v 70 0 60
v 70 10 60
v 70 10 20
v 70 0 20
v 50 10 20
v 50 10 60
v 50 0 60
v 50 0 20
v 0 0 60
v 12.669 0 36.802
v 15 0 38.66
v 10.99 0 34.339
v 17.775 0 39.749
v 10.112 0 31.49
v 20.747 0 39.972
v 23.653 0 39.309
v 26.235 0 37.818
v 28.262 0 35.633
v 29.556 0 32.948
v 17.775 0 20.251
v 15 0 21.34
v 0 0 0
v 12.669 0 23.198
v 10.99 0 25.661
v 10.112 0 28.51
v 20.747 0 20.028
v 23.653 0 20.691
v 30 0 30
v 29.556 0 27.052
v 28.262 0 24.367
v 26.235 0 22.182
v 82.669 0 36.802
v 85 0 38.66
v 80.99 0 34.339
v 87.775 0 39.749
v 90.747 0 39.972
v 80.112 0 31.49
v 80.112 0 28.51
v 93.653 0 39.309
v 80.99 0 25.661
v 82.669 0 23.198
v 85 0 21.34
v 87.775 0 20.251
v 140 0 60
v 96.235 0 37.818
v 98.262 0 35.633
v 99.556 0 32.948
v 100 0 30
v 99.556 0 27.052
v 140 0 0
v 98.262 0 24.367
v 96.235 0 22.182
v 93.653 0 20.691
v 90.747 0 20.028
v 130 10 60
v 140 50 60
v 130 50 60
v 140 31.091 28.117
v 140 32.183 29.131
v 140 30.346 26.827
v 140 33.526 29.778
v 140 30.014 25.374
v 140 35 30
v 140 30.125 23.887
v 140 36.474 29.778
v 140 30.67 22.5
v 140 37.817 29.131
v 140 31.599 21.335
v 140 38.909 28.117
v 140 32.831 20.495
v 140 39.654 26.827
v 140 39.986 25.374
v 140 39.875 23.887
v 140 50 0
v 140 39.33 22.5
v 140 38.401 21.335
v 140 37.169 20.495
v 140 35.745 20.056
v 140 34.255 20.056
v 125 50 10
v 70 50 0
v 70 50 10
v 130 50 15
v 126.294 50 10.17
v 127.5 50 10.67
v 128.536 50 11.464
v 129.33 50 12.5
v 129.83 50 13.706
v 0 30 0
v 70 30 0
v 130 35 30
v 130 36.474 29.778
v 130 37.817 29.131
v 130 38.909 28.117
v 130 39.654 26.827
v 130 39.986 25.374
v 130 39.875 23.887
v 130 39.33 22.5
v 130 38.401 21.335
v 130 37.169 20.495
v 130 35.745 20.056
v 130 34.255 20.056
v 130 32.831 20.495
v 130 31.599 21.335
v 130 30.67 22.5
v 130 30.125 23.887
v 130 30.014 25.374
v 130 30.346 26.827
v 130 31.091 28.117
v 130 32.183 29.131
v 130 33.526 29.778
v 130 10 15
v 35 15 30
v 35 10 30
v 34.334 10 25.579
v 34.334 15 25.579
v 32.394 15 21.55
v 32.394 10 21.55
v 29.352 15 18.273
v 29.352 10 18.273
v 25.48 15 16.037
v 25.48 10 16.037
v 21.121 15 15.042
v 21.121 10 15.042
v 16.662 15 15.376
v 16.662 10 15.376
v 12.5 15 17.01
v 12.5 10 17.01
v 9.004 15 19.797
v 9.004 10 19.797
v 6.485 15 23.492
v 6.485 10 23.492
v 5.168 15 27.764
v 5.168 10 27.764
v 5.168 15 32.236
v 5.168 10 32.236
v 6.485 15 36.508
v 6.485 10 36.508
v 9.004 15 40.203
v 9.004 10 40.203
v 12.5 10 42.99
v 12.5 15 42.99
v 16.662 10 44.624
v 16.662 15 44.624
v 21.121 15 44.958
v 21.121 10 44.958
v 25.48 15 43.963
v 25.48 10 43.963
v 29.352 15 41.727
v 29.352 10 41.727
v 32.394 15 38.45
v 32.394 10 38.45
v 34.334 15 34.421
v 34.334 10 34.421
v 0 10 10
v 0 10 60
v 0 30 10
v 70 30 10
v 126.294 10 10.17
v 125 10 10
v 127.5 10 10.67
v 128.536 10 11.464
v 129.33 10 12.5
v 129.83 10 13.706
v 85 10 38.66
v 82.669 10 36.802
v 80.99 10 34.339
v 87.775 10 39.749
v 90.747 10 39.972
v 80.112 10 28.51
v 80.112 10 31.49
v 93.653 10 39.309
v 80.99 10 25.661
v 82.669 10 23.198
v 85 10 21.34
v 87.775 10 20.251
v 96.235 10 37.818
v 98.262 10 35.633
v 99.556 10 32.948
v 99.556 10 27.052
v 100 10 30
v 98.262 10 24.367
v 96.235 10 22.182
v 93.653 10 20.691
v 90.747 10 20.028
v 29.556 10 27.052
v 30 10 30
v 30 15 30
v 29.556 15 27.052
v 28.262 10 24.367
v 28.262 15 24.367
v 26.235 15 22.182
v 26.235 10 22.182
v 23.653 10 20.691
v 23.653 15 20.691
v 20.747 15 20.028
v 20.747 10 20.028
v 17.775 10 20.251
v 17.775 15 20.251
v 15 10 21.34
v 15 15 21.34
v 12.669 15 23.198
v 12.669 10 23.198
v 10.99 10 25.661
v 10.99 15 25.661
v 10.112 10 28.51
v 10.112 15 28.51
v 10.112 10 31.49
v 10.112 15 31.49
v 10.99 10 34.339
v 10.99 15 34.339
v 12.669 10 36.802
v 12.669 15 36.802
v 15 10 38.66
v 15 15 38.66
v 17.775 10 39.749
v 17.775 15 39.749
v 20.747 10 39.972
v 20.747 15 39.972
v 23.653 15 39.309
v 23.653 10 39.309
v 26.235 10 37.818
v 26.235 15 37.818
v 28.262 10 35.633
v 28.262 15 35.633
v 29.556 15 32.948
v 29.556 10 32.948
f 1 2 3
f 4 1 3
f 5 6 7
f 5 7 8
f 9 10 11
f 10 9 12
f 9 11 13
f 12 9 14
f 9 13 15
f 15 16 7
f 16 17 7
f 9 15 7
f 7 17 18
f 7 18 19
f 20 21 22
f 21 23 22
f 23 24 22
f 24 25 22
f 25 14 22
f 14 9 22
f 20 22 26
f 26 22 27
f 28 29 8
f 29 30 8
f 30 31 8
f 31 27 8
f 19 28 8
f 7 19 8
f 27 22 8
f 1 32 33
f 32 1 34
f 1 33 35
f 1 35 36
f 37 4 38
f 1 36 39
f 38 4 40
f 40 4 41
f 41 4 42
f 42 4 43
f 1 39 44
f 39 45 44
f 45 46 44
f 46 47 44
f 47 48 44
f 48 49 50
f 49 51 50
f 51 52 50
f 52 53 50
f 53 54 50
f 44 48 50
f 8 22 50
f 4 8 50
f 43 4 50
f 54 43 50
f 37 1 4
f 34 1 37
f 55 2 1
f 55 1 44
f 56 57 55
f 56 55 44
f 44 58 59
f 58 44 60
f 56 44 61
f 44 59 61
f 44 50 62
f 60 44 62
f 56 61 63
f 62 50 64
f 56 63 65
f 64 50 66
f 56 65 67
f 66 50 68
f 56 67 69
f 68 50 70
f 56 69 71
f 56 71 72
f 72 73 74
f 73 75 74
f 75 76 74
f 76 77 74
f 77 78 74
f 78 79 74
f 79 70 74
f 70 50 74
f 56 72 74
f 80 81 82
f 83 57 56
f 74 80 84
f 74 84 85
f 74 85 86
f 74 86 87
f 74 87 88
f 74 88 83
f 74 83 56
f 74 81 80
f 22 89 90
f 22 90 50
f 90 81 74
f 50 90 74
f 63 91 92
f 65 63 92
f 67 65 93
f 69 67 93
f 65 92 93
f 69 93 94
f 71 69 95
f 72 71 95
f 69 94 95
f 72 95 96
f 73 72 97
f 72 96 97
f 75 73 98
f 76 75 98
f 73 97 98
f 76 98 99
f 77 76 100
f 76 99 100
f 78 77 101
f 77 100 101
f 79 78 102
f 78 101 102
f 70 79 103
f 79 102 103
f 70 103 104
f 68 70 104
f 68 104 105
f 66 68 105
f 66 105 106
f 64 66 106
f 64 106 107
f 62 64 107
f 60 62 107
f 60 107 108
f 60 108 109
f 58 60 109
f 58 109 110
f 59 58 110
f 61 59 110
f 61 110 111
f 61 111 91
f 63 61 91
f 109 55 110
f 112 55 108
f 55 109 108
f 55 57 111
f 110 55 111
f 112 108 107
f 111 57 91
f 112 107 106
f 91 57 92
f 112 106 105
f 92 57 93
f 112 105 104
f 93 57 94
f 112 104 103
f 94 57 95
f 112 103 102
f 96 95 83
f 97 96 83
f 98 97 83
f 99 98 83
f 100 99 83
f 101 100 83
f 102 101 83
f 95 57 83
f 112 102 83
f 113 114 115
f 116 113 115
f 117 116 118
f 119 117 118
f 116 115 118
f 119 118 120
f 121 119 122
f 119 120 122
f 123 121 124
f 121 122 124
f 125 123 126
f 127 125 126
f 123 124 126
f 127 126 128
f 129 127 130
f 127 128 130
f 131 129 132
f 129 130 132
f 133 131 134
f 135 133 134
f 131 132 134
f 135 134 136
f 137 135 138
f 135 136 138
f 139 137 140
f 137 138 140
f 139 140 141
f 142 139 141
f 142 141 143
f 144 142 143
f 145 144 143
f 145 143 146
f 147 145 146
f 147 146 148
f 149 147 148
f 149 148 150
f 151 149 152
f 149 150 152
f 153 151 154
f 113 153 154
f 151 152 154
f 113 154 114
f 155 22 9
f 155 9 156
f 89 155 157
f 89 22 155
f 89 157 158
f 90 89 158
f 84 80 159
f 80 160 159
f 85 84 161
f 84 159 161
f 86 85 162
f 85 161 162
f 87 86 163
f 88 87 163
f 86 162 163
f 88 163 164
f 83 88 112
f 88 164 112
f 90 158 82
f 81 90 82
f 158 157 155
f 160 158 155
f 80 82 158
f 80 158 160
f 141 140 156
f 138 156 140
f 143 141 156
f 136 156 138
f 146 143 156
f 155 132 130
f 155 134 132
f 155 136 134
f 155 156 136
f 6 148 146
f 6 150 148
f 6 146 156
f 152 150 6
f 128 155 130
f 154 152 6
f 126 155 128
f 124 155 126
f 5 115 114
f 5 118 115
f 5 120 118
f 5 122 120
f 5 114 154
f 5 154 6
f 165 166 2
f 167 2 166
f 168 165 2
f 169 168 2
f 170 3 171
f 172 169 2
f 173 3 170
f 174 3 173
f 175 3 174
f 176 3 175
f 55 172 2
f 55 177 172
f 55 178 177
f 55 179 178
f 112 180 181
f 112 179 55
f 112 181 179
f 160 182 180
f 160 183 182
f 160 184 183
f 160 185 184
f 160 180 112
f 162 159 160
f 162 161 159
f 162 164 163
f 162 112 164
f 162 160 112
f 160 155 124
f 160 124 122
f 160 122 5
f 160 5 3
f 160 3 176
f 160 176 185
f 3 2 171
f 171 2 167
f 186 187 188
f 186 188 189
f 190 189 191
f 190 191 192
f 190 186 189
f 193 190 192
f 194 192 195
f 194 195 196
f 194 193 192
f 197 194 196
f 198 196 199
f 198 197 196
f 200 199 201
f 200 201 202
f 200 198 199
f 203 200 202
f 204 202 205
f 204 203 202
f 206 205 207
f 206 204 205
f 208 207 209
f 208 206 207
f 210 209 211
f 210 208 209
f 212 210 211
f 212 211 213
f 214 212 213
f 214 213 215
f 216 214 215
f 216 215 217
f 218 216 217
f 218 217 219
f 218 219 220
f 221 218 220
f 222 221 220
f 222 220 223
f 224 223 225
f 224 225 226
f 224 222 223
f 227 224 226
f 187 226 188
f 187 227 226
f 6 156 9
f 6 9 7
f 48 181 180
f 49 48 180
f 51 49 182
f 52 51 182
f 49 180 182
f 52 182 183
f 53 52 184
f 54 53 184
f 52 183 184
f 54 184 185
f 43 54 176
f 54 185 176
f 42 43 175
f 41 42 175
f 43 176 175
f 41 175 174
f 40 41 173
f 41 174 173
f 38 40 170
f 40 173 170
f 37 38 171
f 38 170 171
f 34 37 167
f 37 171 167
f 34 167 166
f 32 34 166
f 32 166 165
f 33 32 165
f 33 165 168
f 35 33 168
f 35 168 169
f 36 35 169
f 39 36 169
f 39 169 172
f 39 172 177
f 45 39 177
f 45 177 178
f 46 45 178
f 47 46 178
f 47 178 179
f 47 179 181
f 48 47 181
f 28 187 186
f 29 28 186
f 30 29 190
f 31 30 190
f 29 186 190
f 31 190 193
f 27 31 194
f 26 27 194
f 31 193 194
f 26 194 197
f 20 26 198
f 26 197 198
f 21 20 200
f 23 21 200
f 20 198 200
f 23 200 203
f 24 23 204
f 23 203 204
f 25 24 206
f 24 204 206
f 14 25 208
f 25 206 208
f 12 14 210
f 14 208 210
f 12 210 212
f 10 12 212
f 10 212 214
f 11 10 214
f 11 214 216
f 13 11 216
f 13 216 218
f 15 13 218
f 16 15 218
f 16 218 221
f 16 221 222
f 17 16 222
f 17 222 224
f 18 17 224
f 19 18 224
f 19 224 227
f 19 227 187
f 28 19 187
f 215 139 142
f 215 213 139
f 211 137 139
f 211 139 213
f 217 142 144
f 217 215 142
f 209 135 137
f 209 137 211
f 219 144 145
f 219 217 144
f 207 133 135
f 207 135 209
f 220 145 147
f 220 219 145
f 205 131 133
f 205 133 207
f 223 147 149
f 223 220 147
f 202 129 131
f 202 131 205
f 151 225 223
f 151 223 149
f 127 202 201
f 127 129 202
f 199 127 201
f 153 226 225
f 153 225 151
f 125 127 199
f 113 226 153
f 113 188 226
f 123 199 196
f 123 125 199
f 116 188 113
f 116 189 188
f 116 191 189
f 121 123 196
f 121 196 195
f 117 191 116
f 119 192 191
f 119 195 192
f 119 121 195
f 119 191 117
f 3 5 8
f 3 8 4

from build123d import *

# Parameters (mm, degrees)
IZIM1_W                     = 140
IZIM1_H                     = 50
Y_KSEKLIK_EKSTR_ZYON1_DEPTH = 60
IZIM2_W                     = 130
IZIM2_H                     = 50
KES_EKSTR_ZYON1_DEPTH       = 40
RADYUS1_R                   = 5
IZIM3_R                     = 15
IZIM3_R_2                   = 10
Y_KSEKLIK_EKSTR_ZYON2_DEPTH = 5
IZIM3_2_R                   = 10
KES_EKSTR_ZYON2_DEPTH       = 11
IZIM5_W                     = 70
IZIM5_H                     = 20
KES_EKSTR_ZYON3_DEPTH       = 11
IZIM6_W                     = 20
IZIM6_H                     = 40
KES_EKSTR_ZYON5_DEPTH       = 11
IZIM7_R                     = 10
KES_EKSTR_ZYON6_DEPTH       = 11
IZIM8_R                     = 5
KES_EKSTR_ZYON7_DEPTH       = 11


with BuildPart() as part:
    # Çizim1 → Yükseklik-Ekstrüzyon1 (new body)
    with BuildSketch(Plane.XY):
        with Locations((70, 25)):
            Rectangle(IZIM1_W, IZIM1_H)
    extrude(amount=Y_KSEKLIK_EKSTR_ZYON1_DEPTH)

    # Çizim2 → Kes-Ekstrüzyon1 (cut)
    with BuildSketch(Plane(origin=(0, 50, 0), x_dir=(1, 0, 0), z_dir=(0, 1, 0))):
        with Locations((65, -35)):
            Rectangle(IZIM2_W, IZIM2_H)
    extrude(amount=-KES_EKSTR_ZYON1_DEPTH, mode=Mode.SUBTRACT)

    # Radyus1
    radyus1_edges = [part.edges().sort_by_distance(p)[0] for p in [
        (130, 30, 10),
    ]]
    fillet(radyus1_edges, radius=RADYUS1_R)

    # Çizim3 → Yükseklik-Ekstrüzyon2 (add)
    with BuildSketch(Plane(origin=(0, 10, 0), x_dir=(1, 0, 0), z_dir=(0, 1, 0))):
        with Locations((20, -30)):
            Circle(IZIM3_R)
        with Locations((20, -30)):
            Circle(IZIM3_R_2, mode=Mode.SUBTRACT)
    extrude(amount=Y_KSEKLIK_EKSTR_ZYON2_DEPTH)

    # Çizim3<2> → Kes-Ekstrüzyon2 (cut, through all)
    with BuildSketch(Plane(origin=(0, 10, 0), x_dir=(1, 0, 0), z_dir=(0, 1, 0))):
        with Locations((20, -30)):
            Circle(IZIM3_2_R)
    extrude(amount=-KES_EKSTR_ZYON2_DEPTH, mode=Mode.SUBTRACT)

    # Çizim5 → Kes-Ekstrüzyon3 (cut, through all)
    with BuildSketch(Plane.XY.offset(10)):
        with Locations((35, 40)):
            Rectangle(IZIM5_W, IZIM5_H)
    extrude(amount=-KES_EKSTR_ZYON3_DEPTH, mode=Mode.SUBTRACT)

    # Çizim6 → Kes-Ekstrüzyon5 (cut, through all)
    with BuildSketch(Plane(origin=(0, 10, 0), x_dir=(1, 0, 0), z_dir=(0, 1, 0))):
        with Locations((60, -40)):
            Rectangle(IZIM6_W, IZIM6_H)
    extrude(amount=-KES_EKSTR_ZYON5_DEPTH, mode=Mode.SUBTRACT)

    # Çizim7 → Kes-Ekstrüzyon6 (cut, through all)
    with BuildSketch(Plane(origin=(0, 10, 0), x_dir=(1, 0, 0), z_dir=(0, 1, 0))):
        with Locations((90, -30)):
            Circle(IZIM7_R)
    extrude(amount=-KES_EKSTR_ZYON6_DEPTH, mode=Mode.SUBTRACT)

    # Çizim8 → Kes-Ekstrüzyon7 (cut, through all)
    with BuildSketch(Plane.ZY.offset(-130)):
        with Locations((25, 35)):
            Circle(IZIM8_R)
    extrude(amount=-KES_EKSTR_ZYON7_DEPTH, mode=Mode.SUBTRACT)


solid = part.part
